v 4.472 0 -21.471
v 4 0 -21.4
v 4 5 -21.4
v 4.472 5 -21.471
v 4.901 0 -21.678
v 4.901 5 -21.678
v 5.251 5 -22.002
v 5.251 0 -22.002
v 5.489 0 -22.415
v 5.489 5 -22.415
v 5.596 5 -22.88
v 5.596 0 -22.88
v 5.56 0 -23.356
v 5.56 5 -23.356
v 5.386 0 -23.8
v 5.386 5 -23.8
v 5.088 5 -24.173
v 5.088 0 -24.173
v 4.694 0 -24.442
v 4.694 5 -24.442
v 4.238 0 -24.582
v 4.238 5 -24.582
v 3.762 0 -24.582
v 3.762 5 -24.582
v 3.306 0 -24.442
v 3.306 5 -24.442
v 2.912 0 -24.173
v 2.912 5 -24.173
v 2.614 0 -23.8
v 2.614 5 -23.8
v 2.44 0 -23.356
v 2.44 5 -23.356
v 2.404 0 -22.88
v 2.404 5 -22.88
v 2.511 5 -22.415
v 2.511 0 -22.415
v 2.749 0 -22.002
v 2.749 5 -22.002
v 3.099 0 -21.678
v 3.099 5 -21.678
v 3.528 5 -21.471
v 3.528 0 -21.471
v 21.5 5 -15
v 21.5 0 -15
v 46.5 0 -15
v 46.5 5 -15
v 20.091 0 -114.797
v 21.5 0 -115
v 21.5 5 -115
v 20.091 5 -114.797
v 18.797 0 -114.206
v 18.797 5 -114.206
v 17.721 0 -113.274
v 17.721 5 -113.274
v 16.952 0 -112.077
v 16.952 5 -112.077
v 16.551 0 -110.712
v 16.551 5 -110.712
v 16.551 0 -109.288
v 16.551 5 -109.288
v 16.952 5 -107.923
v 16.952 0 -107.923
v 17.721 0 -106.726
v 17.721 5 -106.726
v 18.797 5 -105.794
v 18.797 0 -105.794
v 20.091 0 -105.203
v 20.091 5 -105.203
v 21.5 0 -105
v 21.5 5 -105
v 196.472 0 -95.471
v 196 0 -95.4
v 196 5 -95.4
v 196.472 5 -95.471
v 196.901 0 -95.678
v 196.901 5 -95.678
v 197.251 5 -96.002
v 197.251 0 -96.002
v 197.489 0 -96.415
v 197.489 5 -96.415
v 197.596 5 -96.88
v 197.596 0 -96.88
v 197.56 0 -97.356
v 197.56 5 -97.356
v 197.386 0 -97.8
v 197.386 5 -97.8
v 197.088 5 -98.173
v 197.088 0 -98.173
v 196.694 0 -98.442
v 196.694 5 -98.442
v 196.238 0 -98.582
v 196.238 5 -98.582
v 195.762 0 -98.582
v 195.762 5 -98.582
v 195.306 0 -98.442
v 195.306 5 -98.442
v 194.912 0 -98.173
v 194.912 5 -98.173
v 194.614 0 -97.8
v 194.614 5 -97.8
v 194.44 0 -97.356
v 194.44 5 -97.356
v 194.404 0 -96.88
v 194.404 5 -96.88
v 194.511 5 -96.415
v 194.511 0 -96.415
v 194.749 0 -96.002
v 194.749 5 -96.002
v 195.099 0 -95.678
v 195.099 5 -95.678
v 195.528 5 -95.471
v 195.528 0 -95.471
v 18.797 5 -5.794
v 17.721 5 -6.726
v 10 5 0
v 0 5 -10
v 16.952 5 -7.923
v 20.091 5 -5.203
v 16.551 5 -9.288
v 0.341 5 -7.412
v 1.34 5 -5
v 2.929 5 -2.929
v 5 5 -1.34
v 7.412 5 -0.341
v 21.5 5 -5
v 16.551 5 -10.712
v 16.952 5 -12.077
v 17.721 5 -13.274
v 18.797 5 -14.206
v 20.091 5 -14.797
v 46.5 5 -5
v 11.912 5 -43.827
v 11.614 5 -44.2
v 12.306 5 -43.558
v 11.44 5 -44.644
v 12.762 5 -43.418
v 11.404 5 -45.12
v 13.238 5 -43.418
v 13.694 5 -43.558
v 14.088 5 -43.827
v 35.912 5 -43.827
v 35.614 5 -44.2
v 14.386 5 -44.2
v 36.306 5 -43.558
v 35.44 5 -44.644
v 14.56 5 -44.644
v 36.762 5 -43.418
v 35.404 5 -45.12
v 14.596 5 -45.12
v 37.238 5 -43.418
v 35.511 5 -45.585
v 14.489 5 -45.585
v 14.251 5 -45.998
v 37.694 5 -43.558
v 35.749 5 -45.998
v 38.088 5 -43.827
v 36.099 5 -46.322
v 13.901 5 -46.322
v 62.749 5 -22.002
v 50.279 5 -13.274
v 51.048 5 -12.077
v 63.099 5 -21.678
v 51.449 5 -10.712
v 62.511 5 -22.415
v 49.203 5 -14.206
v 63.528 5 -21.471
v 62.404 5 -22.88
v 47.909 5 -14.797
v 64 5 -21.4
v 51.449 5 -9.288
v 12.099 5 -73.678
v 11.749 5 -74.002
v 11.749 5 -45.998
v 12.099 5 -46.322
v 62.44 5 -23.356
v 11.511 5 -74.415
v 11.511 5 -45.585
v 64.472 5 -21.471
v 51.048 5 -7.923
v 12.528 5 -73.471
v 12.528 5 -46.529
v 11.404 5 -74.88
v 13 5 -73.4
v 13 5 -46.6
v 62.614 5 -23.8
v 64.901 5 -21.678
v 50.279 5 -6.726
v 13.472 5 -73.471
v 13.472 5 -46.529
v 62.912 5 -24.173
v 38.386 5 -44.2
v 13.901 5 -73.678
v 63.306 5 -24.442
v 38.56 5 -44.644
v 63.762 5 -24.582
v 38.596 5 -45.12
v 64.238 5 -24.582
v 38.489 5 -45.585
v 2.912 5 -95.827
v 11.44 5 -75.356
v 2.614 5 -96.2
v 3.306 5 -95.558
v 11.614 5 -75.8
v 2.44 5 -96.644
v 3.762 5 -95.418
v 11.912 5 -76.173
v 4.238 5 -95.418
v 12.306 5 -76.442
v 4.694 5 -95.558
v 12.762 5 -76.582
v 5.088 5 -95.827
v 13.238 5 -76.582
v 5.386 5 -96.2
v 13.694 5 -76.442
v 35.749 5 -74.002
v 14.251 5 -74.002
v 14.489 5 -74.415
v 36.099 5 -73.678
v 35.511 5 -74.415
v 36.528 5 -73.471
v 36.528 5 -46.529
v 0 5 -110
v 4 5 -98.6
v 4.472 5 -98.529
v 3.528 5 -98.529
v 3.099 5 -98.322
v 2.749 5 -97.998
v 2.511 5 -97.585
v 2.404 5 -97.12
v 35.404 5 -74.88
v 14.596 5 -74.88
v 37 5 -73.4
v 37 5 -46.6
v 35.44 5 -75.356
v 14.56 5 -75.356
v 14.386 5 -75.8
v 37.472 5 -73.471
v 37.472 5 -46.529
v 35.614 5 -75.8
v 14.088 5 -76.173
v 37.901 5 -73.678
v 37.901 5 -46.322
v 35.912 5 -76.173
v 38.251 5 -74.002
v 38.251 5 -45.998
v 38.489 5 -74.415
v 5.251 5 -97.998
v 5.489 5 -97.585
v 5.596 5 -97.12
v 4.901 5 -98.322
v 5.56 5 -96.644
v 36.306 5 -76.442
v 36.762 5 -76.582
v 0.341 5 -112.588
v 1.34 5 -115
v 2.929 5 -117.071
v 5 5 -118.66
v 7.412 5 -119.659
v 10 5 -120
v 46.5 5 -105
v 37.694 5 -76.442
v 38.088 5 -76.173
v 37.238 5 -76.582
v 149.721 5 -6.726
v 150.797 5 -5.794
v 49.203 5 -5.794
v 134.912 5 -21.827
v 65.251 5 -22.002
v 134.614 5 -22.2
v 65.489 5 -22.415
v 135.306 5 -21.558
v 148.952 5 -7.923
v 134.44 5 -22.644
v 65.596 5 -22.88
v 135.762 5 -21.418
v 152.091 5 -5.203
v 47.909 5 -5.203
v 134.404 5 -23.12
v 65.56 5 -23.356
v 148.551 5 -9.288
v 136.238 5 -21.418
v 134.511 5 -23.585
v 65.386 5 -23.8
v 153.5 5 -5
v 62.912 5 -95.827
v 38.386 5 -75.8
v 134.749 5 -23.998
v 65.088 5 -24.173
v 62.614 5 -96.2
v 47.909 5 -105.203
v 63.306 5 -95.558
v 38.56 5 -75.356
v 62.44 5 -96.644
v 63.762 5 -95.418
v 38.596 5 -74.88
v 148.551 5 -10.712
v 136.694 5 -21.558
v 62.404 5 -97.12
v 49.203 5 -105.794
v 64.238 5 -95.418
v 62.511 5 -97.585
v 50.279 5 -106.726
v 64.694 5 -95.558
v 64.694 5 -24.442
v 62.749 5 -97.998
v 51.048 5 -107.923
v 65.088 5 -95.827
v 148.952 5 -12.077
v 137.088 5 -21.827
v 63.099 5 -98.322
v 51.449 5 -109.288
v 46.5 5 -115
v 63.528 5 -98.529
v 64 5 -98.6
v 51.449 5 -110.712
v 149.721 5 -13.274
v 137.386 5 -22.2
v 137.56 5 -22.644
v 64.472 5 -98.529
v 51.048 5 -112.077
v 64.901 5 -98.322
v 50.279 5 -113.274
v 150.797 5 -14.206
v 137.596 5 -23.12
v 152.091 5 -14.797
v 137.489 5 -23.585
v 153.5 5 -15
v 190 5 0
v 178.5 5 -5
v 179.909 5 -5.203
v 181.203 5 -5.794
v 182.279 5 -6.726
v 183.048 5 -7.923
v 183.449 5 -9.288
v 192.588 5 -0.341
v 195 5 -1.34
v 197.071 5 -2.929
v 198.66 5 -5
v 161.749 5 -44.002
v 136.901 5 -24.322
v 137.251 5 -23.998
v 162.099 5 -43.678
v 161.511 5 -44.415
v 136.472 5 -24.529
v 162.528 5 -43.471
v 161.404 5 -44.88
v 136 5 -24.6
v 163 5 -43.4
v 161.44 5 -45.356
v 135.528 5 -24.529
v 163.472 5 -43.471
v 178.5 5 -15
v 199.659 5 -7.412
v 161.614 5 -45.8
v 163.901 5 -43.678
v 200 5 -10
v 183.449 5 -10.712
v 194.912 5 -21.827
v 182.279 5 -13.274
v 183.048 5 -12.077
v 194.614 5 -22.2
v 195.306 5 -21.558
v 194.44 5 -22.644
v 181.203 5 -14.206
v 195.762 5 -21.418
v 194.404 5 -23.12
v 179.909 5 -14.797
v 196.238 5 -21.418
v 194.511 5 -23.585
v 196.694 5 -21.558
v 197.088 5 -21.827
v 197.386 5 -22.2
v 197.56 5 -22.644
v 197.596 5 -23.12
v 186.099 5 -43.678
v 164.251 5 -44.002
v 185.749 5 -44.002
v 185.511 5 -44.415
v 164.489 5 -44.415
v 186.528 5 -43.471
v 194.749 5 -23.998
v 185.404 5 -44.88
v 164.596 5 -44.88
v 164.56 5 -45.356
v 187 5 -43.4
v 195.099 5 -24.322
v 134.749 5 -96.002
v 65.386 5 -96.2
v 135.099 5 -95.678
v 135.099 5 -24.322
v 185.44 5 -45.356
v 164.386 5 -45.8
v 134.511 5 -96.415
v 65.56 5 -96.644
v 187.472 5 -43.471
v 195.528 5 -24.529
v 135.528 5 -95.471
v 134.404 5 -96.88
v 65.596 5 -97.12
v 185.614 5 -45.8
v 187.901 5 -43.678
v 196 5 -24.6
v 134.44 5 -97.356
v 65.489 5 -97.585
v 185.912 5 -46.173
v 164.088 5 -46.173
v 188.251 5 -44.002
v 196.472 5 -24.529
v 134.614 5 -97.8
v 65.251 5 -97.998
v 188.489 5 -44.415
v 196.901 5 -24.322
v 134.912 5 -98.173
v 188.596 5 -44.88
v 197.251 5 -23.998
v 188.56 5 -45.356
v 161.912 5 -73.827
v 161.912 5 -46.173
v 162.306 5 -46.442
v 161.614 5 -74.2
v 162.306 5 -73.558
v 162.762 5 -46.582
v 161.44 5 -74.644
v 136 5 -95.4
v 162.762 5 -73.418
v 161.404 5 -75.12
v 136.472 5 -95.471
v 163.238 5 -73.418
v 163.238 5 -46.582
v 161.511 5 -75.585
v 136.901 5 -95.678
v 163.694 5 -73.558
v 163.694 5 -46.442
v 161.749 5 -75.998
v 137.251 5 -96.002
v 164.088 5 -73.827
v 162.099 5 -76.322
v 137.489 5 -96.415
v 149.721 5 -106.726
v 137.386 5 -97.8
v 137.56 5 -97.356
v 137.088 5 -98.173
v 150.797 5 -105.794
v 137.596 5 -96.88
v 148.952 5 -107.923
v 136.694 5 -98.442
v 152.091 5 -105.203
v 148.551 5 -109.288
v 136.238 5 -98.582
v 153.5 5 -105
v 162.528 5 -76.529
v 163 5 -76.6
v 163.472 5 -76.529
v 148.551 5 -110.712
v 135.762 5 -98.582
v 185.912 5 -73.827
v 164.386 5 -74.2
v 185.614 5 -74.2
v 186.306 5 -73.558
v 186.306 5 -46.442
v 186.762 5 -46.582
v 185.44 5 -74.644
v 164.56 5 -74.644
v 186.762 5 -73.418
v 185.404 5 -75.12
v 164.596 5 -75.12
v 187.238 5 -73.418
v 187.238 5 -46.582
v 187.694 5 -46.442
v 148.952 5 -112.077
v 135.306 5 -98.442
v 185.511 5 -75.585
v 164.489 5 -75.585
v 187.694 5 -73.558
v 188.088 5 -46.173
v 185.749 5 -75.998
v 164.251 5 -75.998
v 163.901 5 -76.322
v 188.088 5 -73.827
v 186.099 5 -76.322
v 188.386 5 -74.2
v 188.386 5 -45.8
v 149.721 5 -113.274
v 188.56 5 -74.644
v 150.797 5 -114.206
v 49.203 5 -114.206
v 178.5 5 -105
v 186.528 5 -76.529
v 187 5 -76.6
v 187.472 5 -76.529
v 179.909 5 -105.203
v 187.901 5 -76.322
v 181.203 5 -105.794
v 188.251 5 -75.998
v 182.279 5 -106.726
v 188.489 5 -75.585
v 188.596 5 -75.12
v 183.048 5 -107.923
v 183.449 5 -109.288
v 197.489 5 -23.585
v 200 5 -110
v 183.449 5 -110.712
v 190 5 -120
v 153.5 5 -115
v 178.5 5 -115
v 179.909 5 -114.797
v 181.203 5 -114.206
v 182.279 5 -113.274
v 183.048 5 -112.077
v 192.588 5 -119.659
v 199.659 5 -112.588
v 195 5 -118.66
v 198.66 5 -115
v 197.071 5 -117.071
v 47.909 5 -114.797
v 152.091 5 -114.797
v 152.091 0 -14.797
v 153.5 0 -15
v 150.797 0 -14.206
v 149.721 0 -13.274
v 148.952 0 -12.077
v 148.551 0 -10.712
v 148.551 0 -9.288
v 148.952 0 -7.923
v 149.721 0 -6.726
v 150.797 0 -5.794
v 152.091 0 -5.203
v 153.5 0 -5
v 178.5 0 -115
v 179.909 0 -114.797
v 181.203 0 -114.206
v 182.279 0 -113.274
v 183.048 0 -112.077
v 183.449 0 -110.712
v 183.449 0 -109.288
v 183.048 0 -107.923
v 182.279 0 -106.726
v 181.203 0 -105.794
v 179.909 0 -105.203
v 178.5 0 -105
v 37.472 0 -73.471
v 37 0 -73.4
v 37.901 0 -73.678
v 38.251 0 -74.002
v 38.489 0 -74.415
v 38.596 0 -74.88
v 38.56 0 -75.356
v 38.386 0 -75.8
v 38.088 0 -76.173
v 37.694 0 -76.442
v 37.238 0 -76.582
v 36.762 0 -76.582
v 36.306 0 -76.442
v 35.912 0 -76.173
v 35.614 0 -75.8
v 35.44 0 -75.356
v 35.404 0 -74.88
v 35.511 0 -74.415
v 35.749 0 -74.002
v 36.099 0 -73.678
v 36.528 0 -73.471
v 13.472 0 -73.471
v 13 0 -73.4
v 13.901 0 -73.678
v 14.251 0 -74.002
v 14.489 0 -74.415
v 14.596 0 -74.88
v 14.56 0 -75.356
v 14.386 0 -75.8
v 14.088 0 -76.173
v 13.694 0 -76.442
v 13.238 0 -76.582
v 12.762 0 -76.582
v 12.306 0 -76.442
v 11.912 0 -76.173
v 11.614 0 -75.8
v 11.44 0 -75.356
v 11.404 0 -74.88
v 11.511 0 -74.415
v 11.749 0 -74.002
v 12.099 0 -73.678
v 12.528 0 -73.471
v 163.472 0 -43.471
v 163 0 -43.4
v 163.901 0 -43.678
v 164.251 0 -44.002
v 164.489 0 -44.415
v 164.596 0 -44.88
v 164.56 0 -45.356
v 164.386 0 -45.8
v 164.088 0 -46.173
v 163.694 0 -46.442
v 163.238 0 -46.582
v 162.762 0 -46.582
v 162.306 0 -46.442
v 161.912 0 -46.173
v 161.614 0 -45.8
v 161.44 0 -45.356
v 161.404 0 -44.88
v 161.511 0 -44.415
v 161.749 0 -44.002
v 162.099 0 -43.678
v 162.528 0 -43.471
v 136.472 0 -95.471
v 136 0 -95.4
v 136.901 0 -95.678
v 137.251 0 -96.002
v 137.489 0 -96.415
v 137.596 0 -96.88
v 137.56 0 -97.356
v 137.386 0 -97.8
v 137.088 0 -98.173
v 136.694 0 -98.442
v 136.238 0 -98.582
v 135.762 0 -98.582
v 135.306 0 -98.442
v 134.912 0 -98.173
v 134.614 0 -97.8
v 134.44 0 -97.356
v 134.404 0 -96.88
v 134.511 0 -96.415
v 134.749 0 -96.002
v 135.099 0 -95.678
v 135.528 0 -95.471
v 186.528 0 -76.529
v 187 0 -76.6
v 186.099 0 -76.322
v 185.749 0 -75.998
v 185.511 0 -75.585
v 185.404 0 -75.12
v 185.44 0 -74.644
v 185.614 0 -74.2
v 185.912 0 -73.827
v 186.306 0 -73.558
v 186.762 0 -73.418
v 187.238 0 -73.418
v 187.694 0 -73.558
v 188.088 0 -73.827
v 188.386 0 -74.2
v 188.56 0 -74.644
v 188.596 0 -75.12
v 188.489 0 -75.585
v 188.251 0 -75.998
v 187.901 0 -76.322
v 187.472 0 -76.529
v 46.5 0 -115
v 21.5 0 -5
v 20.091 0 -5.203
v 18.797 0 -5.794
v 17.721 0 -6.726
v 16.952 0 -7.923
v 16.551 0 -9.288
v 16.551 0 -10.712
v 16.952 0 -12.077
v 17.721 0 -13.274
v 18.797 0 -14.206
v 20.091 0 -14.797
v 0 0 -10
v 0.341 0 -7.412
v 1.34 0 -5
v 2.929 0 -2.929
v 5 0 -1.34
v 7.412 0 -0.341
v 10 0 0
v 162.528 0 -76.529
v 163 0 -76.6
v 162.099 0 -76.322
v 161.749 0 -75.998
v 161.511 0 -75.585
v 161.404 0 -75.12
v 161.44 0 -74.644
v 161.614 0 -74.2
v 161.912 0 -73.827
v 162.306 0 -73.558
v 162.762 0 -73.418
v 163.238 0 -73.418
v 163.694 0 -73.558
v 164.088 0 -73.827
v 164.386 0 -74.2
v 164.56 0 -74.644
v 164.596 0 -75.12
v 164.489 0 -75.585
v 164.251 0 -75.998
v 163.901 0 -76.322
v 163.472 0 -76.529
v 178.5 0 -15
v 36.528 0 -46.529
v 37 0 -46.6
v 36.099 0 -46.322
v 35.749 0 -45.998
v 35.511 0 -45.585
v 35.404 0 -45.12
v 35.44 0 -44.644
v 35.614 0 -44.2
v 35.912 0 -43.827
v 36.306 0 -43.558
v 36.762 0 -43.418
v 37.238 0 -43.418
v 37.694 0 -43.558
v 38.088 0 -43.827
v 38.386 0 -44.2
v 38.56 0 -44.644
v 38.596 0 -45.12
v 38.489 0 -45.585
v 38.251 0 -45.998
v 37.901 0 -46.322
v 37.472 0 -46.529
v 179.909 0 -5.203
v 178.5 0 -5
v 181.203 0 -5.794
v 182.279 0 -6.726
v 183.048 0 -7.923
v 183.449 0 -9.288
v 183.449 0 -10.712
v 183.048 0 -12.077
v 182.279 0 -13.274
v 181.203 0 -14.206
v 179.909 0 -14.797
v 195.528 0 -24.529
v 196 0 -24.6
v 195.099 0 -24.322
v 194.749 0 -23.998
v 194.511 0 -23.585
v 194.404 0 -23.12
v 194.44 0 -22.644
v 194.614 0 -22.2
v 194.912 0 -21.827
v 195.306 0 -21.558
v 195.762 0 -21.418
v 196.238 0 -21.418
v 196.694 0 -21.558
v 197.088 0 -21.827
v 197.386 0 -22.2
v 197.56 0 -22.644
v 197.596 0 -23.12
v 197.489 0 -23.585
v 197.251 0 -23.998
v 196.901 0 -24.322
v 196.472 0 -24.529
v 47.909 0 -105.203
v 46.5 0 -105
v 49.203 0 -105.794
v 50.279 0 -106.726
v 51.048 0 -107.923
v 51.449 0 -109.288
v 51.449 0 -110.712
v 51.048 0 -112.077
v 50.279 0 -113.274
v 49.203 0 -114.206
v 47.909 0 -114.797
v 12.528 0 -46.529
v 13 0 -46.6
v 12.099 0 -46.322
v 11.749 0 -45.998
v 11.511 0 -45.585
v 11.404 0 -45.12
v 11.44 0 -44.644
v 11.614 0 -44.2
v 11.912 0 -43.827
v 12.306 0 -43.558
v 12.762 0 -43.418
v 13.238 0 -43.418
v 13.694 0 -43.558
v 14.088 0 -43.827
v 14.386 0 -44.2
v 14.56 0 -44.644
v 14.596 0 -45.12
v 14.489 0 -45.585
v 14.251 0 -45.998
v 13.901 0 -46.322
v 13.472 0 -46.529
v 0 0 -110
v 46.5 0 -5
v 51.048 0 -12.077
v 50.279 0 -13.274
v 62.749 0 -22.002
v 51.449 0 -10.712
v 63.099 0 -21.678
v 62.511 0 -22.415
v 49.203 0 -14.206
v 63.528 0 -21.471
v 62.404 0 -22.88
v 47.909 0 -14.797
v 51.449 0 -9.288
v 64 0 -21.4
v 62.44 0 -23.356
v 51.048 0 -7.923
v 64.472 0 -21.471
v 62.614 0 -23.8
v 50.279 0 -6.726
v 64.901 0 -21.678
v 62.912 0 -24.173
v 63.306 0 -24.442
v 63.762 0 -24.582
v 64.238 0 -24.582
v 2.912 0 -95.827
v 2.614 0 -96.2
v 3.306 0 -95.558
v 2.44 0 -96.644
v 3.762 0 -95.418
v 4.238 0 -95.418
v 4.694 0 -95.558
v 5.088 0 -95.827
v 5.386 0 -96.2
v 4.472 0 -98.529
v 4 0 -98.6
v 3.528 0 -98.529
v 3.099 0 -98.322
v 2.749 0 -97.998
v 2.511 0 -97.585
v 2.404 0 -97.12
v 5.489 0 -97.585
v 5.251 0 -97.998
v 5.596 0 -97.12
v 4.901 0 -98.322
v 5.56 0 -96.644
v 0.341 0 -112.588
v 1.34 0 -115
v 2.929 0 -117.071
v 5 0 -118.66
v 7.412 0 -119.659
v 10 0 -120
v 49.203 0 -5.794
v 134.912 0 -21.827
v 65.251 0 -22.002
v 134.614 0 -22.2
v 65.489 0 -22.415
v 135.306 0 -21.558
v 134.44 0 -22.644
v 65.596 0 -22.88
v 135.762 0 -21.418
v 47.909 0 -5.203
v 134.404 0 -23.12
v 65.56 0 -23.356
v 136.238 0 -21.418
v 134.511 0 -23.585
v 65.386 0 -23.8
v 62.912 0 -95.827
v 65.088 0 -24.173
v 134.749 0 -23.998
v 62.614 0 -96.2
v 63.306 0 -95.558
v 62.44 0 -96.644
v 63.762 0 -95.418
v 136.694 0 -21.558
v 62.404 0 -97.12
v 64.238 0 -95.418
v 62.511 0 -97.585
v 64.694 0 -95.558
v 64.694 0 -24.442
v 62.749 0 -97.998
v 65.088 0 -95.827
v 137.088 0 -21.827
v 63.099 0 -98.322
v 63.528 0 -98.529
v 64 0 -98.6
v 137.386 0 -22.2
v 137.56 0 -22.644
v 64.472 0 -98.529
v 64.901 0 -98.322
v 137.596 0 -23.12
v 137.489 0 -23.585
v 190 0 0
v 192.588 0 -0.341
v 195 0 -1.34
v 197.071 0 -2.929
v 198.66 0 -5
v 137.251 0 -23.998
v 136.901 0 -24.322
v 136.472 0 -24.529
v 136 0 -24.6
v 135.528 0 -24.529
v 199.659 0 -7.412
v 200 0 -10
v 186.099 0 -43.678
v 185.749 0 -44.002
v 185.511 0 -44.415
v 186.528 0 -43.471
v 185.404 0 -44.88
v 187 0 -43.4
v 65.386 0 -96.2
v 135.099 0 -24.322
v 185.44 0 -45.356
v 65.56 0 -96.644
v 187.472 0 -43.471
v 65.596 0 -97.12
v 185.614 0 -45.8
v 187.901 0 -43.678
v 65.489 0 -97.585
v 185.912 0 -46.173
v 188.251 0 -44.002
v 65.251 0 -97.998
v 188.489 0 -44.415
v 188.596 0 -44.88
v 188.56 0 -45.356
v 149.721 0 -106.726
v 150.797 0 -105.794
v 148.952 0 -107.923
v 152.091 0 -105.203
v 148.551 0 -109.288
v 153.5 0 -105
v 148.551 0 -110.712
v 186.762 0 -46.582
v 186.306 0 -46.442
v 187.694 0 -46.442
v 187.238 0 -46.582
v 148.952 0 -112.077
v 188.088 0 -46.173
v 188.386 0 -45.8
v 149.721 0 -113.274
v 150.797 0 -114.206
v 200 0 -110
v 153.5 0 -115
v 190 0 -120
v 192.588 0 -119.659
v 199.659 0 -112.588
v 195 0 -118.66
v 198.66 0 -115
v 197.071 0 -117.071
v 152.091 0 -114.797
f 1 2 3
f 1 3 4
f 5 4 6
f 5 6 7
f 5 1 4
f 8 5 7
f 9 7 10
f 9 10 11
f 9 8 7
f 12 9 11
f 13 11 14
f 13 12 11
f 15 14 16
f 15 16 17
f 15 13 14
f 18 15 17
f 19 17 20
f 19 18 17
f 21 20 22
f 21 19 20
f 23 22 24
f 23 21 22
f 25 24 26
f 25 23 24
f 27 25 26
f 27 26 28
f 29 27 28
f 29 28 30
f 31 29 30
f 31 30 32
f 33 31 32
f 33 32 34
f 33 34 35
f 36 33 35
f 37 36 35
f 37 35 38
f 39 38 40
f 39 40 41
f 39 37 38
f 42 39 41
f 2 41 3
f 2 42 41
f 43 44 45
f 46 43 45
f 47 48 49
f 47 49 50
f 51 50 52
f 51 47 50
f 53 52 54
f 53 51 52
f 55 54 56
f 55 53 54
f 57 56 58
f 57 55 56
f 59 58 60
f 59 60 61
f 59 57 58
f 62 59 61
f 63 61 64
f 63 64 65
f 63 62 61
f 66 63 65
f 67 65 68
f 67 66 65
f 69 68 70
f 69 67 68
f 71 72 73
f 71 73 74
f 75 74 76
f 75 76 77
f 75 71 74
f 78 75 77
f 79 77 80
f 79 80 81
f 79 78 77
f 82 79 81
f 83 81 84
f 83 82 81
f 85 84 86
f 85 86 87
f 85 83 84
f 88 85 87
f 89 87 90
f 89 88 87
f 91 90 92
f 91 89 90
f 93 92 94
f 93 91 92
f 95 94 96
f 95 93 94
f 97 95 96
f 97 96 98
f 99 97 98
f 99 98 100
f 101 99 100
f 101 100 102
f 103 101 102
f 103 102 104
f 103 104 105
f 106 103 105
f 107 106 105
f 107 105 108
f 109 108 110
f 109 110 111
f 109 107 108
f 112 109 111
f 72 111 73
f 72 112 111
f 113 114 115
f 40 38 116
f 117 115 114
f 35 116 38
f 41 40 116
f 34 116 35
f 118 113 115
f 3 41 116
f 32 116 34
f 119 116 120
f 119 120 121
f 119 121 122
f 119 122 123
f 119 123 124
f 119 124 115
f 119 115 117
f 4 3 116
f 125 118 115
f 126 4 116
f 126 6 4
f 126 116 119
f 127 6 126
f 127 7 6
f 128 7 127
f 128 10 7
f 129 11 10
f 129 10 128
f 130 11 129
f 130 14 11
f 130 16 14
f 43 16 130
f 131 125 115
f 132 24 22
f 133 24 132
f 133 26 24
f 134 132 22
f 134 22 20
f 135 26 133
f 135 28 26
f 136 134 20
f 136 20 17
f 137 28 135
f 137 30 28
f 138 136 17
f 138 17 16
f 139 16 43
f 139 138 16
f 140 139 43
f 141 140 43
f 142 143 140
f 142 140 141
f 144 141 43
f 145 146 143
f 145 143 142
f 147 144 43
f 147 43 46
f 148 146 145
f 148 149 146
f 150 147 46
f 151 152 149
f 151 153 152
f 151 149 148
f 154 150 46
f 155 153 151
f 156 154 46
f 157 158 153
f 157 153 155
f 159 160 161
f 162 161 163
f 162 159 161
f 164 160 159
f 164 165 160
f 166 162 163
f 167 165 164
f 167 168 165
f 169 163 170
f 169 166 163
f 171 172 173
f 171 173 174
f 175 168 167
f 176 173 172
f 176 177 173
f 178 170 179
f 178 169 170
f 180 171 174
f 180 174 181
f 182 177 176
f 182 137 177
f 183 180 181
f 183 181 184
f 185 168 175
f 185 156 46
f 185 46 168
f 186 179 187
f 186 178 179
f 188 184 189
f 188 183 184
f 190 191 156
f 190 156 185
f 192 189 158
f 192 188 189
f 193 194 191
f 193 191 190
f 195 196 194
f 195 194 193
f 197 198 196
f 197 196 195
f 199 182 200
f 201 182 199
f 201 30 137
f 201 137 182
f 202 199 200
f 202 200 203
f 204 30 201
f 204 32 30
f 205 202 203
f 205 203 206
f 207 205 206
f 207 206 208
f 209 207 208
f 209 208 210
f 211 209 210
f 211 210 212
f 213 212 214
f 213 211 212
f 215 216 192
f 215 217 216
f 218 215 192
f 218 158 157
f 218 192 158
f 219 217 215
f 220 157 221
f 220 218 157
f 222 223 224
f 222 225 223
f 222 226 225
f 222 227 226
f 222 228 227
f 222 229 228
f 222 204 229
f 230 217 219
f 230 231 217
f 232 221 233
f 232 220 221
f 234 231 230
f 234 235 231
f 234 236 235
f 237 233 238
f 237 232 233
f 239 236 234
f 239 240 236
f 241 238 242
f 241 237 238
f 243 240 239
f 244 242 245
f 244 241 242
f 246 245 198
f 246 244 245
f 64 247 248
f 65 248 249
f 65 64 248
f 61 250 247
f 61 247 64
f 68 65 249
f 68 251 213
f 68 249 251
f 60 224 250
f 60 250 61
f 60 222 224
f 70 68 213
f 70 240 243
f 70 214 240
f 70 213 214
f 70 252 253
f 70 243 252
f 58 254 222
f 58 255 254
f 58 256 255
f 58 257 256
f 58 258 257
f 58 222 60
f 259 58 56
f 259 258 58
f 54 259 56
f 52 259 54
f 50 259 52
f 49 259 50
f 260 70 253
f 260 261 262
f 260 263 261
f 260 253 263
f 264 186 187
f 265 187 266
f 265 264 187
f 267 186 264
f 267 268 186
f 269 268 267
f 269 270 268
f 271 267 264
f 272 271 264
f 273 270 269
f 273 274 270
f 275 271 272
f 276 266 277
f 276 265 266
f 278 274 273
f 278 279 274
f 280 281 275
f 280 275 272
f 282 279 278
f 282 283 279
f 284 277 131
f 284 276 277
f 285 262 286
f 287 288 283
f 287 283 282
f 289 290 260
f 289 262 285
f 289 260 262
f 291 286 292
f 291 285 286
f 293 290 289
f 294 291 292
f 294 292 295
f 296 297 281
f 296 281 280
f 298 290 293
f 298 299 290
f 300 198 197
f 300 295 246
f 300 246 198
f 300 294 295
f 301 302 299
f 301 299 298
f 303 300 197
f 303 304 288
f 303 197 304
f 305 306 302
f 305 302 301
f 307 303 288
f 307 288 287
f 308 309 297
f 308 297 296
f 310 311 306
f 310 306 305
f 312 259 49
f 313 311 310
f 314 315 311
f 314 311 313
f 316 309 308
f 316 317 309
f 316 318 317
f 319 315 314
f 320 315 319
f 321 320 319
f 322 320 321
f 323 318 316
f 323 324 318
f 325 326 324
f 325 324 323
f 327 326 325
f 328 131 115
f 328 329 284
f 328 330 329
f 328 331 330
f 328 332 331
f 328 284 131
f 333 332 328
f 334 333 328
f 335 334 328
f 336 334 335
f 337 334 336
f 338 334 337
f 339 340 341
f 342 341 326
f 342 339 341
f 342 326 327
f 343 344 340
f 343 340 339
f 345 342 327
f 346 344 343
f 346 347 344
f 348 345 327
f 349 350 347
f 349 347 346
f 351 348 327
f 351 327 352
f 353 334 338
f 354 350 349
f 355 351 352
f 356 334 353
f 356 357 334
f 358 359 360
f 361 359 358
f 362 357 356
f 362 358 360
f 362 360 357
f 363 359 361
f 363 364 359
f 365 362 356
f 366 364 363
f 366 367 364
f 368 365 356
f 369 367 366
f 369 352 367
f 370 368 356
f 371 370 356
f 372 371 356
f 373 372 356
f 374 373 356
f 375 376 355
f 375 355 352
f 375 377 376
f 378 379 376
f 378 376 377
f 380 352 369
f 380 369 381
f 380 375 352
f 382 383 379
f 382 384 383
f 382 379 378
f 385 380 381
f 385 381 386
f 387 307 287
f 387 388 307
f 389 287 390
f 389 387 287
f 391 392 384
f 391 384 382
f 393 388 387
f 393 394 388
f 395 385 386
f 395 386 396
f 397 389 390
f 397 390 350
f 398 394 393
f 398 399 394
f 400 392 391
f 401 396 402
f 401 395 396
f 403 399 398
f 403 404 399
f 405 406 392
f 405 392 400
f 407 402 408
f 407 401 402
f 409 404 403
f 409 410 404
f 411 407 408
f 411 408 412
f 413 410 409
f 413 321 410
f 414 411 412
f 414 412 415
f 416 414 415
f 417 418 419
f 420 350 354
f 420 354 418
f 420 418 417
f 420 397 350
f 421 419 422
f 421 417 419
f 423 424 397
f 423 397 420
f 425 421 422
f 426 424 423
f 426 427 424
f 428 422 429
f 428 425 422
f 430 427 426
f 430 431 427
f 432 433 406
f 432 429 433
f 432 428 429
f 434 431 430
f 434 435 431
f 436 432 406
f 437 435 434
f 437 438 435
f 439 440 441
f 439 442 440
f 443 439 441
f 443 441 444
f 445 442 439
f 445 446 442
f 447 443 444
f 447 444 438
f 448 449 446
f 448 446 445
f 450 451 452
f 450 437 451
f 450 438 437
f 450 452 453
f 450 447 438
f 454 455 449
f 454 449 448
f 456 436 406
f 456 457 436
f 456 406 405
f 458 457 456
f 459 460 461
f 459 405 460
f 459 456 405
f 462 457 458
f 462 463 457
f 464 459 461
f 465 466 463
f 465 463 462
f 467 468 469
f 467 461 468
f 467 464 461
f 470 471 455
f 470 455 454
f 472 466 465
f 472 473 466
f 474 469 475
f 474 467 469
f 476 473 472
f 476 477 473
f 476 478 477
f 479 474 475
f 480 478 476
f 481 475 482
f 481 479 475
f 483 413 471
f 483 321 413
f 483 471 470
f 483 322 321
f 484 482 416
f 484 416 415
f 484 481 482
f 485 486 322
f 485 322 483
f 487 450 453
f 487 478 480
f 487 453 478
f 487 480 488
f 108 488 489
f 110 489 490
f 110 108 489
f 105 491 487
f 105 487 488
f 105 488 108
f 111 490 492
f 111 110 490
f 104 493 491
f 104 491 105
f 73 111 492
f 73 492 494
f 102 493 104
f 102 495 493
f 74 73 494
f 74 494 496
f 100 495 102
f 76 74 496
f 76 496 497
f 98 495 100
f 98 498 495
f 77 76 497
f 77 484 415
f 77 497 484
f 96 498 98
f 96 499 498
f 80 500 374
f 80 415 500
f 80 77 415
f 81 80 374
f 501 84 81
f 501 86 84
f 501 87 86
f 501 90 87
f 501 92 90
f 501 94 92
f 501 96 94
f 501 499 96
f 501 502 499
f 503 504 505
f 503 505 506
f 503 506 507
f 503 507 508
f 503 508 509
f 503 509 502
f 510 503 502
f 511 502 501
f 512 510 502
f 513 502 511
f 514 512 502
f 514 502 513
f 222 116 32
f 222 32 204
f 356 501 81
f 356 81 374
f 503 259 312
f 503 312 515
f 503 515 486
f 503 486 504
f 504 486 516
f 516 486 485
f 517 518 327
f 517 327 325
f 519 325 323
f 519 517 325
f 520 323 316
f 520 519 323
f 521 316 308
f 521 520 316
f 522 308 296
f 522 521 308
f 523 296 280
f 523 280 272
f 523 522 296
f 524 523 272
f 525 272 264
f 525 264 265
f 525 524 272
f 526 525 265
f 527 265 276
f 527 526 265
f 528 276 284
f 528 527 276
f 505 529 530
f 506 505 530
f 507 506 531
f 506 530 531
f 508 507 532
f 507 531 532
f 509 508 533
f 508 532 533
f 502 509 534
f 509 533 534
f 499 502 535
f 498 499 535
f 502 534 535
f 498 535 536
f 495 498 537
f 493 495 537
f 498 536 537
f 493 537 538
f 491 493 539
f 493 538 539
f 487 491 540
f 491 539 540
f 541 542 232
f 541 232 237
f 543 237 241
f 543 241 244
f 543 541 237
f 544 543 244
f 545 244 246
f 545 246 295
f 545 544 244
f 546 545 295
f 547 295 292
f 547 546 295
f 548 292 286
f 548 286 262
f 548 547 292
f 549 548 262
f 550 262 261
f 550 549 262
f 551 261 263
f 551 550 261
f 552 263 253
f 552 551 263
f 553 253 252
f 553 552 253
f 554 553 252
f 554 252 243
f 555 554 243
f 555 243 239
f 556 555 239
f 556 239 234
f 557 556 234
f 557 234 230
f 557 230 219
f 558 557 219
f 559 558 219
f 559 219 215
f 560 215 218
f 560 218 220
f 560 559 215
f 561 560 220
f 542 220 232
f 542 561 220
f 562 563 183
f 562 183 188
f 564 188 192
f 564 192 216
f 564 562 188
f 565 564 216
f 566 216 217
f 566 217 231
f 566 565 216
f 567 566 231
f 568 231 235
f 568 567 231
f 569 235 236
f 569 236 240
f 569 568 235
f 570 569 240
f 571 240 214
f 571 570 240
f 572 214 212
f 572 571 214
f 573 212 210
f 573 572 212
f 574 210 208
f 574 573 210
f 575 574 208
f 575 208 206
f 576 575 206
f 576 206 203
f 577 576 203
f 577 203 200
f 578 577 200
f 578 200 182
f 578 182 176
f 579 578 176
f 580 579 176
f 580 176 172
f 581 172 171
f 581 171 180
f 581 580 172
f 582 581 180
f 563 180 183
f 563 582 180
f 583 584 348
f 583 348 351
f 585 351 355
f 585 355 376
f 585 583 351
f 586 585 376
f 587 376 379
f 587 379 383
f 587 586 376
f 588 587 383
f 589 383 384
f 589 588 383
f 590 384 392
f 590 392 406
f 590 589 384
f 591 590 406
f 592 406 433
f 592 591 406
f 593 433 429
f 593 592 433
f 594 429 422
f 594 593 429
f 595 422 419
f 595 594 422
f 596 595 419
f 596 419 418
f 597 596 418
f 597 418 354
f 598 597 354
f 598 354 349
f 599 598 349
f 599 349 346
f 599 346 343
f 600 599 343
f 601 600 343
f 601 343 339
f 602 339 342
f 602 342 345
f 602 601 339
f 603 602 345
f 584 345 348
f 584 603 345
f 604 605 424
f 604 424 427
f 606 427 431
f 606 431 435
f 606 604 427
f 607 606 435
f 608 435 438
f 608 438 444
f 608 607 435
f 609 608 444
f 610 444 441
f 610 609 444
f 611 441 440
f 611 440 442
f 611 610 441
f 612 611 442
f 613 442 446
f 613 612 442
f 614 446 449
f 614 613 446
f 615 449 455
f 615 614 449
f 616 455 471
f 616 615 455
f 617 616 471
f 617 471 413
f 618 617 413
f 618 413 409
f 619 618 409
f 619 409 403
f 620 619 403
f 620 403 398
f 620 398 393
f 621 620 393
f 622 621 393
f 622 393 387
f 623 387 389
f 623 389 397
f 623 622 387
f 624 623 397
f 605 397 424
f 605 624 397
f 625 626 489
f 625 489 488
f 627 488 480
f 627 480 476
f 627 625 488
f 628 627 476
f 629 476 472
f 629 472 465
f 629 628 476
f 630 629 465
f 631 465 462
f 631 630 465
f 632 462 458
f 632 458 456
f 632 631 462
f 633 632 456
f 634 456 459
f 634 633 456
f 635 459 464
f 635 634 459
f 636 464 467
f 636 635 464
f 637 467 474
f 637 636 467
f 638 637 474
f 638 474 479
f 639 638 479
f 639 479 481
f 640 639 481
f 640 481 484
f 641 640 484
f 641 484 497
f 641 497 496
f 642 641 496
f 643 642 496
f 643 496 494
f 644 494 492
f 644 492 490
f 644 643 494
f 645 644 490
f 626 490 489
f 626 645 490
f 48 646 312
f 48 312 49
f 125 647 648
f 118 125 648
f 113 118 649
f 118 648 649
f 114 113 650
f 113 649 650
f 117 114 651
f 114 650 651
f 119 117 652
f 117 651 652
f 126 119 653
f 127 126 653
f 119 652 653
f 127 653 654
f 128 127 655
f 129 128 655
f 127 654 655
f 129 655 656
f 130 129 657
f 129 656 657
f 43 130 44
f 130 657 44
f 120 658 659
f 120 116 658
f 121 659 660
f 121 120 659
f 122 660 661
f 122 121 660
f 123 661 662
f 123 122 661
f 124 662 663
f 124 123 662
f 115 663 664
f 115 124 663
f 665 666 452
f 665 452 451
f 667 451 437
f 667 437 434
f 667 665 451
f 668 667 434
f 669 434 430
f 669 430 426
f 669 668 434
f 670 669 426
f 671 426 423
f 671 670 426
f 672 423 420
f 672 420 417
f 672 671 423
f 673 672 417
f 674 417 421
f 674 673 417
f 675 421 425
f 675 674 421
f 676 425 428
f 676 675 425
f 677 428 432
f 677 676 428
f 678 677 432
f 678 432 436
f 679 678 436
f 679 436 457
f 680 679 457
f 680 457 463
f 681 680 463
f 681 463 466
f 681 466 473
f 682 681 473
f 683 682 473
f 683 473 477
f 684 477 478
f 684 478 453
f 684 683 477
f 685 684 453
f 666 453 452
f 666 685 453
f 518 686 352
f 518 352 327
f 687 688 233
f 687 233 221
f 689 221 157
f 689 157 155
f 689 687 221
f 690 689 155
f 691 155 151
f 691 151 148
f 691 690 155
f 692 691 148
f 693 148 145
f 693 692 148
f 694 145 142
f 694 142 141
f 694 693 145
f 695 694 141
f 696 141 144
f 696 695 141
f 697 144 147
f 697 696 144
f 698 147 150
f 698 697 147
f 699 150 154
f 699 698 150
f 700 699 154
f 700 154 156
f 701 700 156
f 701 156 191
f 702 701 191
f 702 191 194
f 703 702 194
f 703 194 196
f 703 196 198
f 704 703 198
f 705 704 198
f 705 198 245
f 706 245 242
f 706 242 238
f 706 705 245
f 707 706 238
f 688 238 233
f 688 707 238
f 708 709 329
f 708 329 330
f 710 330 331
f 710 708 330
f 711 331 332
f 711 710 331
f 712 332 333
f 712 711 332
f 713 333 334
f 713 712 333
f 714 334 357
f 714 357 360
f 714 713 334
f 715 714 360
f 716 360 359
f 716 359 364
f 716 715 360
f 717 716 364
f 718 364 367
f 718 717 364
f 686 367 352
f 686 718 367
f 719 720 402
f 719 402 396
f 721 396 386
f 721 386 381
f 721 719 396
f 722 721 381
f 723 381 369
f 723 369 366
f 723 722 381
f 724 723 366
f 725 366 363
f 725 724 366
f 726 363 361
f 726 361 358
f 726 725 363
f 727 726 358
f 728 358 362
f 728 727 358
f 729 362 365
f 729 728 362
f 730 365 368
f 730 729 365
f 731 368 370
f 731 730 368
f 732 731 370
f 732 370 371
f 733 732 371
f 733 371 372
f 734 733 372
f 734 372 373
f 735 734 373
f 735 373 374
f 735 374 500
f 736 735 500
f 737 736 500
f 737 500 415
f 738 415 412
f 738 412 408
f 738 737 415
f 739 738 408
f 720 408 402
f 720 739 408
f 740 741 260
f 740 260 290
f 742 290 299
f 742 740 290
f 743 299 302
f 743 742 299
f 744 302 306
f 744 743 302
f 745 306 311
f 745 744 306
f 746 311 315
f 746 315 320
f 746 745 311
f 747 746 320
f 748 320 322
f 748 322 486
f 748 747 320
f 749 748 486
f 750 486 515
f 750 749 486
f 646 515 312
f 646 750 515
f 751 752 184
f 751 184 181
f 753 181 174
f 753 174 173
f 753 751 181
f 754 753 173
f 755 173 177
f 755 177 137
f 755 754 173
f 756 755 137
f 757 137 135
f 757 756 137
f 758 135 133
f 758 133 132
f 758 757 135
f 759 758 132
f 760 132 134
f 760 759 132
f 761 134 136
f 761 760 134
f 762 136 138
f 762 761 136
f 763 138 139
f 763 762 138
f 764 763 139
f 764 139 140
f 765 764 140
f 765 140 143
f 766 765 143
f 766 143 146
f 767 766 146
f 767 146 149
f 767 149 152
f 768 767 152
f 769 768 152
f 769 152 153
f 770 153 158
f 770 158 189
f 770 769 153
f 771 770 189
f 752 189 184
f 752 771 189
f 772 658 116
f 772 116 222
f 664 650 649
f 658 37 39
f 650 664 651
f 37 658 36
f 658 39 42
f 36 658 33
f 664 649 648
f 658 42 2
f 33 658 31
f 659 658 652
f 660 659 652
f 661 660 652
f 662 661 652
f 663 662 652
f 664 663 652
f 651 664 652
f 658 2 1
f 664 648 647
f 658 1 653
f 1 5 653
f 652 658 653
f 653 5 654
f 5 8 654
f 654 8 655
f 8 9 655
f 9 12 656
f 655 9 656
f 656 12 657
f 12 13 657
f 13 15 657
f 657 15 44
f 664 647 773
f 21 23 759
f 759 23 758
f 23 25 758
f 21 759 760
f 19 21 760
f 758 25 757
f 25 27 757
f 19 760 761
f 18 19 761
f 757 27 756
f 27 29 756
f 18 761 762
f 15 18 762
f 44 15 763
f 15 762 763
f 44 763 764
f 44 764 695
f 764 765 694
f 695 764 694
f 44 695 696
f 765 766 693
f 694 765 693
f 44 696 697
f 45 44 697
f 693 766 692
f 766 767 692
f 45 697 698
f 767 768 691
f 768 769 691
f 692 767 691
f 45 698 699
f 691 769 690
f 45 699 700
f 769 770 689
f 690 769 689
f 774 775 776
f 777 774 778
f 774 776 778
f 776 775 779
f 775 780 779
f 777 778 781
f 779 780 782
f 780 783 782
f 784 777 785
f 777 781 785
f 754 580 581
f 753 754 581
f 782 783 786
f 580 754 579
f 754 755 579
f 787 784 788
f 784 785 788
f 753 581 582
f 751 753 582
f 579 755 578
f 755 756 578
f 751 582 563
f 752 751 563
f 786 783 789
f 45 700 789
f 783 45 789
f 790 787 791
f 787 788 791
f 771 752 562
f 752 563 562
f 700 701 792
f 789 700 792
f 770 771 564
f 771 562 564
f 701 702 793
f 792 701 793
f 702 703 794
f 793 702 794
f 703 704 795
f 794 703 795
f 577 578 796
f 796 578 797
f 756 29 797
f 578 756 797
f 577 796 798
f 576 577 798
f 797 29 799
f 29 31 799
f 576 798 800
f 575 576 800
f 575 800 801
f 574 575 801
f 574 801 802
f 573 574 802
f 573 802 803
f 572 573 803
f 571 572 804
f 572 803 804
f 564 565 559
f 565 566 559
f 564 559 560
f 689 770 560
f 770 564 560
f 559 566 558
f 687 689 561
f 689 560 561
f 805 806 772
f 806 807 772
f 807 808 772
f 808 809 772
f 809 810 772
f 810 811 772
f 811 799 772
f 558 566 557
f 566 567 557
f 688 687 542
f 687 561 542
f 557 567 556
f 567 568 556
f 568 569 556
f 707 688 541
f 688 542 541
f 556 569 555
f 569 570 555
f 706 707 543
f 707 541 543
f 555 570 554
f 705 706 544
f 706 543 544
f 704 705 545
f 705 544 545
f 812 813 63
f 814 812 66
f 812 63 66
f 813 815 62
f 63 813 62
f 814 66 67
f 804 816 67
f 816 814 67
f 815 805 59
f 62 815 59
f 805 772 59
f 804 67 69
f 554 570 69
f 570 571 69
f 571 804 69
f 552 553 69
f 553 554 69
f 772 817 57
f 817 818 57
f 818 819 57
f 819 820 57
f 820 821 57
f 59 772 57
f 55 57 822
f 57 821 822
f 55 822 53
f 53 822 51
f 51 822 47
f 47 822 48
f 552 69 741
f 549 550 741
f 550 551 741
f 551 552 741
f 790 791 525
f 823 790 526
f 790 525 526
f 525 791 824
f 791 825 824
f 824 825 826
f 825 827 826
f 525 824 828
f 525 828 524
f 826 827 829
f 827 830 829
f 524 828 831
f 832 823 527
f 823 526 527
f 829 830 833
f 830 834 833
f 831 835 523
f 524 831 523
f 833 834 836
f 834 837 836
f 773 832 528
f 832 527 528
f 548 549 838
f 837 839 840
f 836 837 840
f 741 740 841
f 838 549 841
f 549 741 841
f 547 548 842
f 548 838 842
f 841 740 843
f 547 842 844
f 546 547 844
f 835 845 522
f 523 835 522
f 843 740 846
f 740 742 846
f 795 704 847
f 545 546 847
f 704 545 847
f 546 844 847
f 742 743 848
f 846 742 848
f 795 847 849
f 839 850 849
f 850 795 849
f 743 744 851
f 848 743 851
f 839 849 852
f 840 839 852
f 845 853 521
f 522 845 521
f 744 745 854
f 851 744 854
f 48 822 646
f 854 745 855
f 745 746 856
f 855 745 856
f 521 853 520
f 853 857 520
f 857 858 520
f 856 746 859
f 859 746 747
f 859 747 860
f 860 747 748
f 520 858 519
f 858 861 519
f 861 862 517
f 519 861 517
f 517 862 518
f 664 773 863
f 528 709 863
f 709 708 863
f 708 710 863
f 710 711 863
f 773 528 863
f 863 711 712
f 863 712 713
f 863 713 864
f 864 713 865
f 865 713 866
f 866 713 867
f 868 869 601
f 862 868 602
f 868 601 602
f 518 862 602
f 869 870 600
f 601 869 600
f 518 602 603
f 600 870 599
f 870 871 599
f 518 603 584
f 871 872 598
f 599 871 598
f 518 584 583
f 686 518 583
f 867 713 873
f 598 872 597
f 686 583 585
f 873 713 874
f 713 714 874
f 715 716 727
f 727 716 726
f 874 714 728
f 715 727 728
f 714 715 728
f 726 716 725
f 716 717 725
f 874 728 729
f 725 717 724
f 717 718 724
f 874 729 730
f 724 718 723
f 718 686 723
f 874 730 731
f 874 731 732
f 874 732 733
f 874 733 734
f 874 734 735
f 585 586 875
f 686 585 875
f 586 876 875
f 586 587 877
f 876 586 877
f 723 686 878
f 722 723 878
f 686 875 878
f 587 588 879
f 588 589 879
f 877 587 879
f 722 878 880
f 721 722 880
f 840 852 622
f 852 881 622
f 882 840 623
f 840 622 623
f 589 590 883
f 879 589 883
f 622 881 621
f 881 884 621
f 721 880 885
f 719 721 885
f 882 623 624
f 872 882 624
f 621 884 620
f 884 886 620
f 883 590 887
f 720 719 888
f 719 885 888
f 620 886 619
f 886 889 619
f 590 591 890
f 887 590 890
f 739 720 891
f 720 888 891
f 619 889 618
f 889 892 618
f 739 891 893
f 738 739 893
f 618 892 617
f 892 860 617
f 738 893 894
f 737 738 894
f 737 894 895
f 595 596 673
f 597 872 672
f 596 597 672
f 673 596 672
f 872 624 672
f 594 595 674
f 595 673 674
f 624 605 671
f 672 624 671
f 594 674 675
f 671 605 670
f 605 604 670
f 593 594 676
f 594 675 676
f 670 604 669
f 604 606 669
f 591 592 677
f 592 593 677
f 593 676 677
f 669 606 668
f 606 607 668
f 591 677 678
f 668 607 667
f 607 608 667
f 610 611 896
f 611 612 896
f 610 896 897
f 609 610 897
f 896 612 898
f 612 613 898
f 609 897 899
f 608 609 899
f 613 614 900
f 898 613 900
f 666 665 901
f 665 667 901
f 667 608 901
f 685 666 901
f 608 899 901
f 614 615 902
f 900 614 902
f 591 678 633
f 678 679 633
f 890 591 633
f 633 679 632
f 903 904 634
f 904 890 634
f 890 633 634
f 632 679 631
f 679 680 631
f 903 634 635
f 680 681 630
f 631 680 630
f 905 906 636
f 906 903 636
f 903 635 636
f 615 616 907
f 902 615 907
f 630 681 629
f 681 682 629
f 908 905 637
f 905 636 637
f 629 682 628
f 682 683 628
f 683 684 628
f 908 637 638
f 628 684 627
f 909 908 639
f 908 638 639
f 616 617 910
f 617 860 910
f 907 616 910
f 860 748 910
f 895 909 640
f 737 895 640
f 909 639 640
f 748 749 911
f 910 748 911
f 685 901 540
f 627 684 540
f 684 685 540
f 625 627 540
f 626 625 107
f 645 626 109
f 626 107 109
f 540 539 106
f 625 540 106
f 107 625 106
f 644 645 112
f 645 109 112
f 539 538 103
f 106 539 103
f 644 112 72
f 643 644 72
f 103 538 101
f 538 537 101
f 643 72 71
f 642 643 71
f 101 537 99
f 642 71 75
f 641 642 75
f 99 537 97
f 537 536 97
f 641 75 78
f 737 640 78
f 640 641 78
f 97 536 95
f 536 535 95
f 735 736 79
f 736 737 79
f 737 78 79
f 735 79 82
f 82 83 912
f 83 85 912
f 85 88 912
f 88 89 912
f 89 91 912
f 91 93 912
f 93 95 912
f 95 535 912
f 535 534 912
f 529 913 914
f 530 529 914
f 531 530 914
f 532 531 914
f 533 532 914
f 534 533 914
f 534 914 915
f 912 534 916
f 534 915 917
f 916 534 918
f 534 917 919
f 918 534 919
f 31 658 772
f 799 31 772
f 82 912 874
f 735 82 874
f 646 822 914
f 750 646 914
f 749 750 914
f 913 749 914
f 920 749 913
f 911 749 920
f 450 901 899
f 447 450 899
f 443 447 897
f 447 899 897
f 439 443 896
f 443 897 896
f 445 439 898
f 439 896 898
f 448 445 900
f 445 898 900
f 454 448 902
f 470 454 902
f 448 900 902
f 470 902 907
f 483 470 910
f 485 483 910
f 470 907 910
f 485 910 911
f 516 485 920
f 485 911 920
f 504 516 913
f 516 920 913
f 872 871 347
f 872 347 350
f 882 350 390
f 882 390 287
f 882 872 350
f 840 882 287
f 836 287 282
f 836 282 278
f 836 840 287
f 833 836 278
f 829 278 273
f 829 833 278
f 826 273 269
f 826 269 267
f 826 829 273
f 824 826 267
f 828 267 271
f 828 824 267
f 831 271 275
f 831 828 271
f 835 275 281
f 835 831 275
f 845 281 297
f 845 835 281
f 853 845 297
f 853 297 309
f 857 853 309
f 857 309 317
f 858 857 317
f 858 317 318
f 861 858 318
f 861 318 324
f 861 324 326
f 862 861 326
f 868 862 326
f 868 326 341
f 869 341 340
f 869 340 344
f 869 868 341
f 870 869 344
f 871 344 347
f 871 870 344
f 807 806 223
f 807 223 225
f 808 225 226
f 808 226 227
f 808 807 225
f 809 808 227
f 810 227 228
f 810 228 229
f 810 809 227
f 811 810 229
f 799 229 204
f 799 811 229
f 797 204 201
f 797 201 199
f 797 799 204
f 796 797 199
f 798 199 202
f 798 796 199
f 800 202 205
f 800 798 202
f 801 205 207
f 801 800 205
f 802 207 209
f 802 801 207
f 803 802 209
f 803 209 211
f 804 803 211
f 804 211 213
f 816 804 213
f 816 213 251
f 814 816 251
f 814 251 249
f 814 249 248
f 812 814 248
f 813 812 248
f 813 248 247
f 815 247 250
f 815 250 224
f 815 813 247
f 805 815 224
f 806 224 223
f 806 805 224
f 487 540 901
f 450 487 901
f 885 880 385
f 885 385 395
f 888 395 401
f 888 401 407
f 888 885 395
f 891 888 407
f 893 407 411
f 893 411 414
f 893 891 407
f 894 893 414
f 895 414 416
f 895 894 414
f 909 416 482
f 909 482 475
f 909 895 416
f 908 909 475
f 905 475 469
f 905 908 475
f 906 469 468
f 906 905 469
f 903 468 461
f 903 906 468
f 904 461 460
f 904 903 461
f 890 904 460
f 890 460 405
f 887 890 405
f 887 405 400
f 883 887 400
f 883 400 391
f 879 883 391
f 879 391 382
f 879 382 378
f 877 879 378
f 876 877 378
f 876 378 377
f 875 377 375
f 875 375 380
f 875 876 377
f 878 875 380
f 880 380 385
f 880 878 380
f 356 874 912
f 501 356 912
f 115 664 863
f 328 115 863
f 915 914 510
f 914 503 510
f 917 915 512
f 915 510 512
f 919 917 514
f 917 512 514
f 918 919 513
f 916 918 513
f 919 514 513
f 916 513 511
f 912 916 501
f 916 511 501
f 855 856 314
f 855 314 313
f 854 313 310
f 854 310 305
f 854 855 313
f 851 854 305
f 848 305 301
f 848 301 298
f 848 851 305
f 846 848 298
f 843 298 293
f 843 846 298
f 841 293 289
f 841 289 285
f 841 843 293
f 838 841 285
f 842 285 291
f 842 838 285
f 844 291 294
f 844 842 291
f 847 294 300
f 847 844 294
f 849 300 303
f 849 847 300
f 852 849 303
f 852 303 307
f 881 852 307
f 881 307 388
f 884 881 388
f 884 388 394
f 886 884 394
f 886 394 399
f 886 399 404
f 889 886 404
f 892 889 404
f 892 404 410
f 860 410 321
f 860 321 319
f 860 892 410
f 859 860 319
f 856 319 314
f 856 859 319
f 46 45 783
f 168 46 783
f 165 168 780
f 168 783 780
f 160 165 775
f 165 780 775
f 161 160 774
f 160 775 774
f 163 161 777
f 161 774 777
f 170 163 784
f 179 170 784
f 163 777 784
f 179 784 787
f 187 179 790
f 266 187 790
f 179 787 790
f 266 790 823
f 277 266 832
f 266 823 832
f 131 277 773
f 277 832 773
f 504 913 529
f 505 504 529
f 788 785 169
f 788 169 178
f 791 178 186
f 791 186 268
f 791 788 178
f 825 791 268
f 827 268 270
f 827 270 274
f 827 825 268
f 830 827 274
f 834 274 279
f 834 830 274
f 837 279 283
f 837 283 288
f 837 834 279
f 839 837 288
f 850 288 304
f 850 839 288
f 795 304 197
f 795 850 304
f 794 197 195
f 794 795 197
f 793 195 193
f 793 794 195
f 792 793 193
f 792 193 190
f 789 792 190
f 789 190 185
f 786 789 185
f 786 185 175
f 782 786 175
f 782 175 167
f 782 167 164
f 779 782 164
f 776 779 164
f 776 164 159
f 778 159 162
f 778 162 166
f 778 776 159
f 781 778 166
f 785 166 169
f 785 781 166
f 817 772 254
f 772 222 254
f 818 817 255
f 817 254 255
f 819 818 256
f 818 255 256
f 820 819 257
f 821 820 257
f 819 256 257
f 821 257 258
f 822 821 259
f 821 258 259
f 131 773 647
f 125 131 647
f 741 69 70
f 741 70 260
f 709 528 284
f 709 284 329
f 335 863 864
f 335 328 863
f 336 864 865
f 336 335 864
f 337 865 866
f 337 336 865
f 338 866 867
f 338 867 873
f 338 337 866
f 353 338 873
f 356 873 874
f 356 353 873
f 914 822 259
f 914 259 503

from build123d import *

# Parameters (mm, degrees)
SKETCH_2_W      = 200
SKETCH_2_H      = 120
SKETCH_2_R      = 1.6
EXTRUDE_1_DEPTH = 5
FILLET_1_R      = 10


with BuildPart() as part:
    # 草图2 → 凸台-拉伸1 (new body)
    with BuildSketch(Plane(origin=(0, 0, 0), x_dir=(1, 0, 0), z_dir=(0, 1, 0))):
        with Locations((100, 60)):
            Rectangle(SKETCH_2_W, SKETCH_2_H)
        with Locations(Location((187, 45, 0), (0, 0, 270))):
            Circle(SKETCH_2_R, mode=Mode.SUBTRACT)
        with Locations(Location((187, 75, 0), (0, 0, 90))):
            Circle(SKETCH_2_R, mode=Mode.SUBTRACT)
        with Locations(Location((163, 45, 0), (0, 0, 270))):
            Circle(SKETCH_2_R, mode=Mode.SUBTRACT)
        with Locations(Location((163, 75, 0), (0, 0, 90))):
            Circle(SKETCH_2_R, mode=Mode.SUBTRACT)
        with Locations(Location((13, 45, 0), (0, 0, 90))):
            Circle(SKETCH_2_R, mode=Mode.SUBTRACT)
        with Locations(Location((37, 45, 0), (0, 0, 90))):
            Circle(SKETCH_2_R, mode=Mode.SUBTRACT)
        with Locations(Location((13, 75, 0), (0, 0, 270))):
            Circle(SKETCH_2_R, mode=Mode.SUBTRACT)
        with Locations(Location((37, 75, 0), (0, 0, 270))):
            Circle(SKETCH_2_R, mode=Mode.SUBTRACT)
        with Locations(Location((196, 97, 0), (0, 0, 270))):
            Circle(SKETCH_2_R, mode=Mode.SUBTRACT)
        with Locations(Location((136, 97, 0), (0, 0, 270))):
            Circle(SKETCH_2_R, mode=Mode.SUBTRACT)
        with Locations(Location((196, 23, 0), (0, 0, 90))):
            Circle(SKETCH_2_R, mode=Mode.SUBTRACT)
        with Locations(Location((136, 23, 0), (0, 0, 90))):
            Circle(SKETCH_2_R, mode=Mode.SUBTRACT)
        with Locations(Location((4, 23, 0), (0, 0, 270))):
            Circle(SKETCH_2_R, mode=Mode.SUBTRACT)
        with Locations(Location((4, 97, 0), (0, 0, 90))):
            Circle(SKETCH_2_R, mode=Mode.SUBTRACT)
        with Locations(Location((64, 23, 0), (0, 0, 270))):
            Circle(SKETCH_2_R, mode=Mode.SUBTRACT)
        with Locations(Location((64, 97, 0), (0, 0, 90))):
            Circle(SKETCH_2_R, mode=Mode.SUBTRACT)
        with BuildLine():
            Line((153.5, 115), (178.5, 115))
            ThreePointArc((178.5, 115), (183.5, 110), (178.5, 105))
            Line((178.5, 105), (153.5, 105))
            ThreePointArc((153.5, 105), (148.5, 110), (153.5, 115))
        make_face(mode=Mode.SUBTRACT)
        with BuildLine():
            Line((153.5, 5), (178.5, 5))
            ThreePointArc((178.5, 5), (183.5, 10), (178.5, 15))
            Line((178.5, 15), (153.5, 15))
            ThreePointArc((153.5, 15), (148.5, 10), (153.5, 5))
        make_face(mode=Mode.SUBTRACT)
        with BuildLine():
            Line((46.5, 115), (21.5, 115))
            ThreePointArc((21.5, 115), (16.5, 110), (21.5, 105))
            Line((21.5, 105), (46.5, 105))
            ThreePointArc((46.5, 105), (51.5, 110), (46.5, 115))
        make_face(mode=Mode.SUBTRACT)
        with BuildLine():
            Line((46.5, 5), (21.5, 5))
            ThreePointArc((21.5, 5), (16.5, 10), (21.5, 15))
            Line((21.5, 15), (46.5, 15))
            ThreePointArc((46.5, 15), (51.5, 10), (46.5, 5))
        make_face(mode=Mode.SUBTRACT)
    extrude(amount=EXTRUDE_1_DEPTH)

    # 圆角1
    fillet_1_edges = [part.edges().sort_by_distance(p)[0] for p in [
        (0, 2.5, -120),
        (200, 2.5, -120),
        (200, 2.5, 0),
        (0, 2.5, 0),
    ]]
    fillet(fillet_1_edges, radius=FILLET_1_R)


solid = part.part
